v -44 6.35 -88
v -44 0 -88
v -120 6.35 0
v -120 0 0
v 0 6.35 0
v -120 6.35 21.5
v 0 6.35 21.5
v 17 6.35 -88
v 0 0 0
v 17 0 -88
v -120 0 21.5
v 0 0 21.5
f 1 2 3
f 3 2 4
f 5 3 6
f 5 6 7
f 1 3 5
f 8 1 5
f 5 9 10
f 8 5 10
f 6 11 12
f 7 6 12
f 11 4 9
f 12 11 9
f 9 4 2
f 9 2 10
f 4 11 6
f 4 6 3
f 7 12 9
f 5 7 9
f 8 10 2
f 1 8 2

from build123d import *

# Parameters (mm, degrees)
BOSS_EXTRUDE1_DEPTH = 6.35
SKETCH3_W           = 120
SKETCH3_H           = 21.5
BOSS_EXTRUDE2_DEPTH = 6.35


with BuildPart() as part:
    # Sketch1 → Boss-Extrude1 (new body)
    with BuildSketch(Plane(origin=(0, 0, 0), x_dir=(1, 0, 0), z_dir=(0, 1, 0))):
        Polygon((-120, 0), (0, 0), (17, 88), (-44, 88), align=None)
    extrude(amount=BOSS_EXTRUDE1_DEPTH)

    # Sketch3 → Boss-Extrude2 (add)
    with BuildSketch(Plane(origin=(0, 0, 0), x_dir=(1, 0, 0), z_dir=(0, 1, 0))):
        with Locations((-60, -10.75)):
            Rectangle(SKETCH3_W, SKETCH3_H)
    extrude(amount=BOSS_EXTRUDE2_DEPTH)


solid = part.part
